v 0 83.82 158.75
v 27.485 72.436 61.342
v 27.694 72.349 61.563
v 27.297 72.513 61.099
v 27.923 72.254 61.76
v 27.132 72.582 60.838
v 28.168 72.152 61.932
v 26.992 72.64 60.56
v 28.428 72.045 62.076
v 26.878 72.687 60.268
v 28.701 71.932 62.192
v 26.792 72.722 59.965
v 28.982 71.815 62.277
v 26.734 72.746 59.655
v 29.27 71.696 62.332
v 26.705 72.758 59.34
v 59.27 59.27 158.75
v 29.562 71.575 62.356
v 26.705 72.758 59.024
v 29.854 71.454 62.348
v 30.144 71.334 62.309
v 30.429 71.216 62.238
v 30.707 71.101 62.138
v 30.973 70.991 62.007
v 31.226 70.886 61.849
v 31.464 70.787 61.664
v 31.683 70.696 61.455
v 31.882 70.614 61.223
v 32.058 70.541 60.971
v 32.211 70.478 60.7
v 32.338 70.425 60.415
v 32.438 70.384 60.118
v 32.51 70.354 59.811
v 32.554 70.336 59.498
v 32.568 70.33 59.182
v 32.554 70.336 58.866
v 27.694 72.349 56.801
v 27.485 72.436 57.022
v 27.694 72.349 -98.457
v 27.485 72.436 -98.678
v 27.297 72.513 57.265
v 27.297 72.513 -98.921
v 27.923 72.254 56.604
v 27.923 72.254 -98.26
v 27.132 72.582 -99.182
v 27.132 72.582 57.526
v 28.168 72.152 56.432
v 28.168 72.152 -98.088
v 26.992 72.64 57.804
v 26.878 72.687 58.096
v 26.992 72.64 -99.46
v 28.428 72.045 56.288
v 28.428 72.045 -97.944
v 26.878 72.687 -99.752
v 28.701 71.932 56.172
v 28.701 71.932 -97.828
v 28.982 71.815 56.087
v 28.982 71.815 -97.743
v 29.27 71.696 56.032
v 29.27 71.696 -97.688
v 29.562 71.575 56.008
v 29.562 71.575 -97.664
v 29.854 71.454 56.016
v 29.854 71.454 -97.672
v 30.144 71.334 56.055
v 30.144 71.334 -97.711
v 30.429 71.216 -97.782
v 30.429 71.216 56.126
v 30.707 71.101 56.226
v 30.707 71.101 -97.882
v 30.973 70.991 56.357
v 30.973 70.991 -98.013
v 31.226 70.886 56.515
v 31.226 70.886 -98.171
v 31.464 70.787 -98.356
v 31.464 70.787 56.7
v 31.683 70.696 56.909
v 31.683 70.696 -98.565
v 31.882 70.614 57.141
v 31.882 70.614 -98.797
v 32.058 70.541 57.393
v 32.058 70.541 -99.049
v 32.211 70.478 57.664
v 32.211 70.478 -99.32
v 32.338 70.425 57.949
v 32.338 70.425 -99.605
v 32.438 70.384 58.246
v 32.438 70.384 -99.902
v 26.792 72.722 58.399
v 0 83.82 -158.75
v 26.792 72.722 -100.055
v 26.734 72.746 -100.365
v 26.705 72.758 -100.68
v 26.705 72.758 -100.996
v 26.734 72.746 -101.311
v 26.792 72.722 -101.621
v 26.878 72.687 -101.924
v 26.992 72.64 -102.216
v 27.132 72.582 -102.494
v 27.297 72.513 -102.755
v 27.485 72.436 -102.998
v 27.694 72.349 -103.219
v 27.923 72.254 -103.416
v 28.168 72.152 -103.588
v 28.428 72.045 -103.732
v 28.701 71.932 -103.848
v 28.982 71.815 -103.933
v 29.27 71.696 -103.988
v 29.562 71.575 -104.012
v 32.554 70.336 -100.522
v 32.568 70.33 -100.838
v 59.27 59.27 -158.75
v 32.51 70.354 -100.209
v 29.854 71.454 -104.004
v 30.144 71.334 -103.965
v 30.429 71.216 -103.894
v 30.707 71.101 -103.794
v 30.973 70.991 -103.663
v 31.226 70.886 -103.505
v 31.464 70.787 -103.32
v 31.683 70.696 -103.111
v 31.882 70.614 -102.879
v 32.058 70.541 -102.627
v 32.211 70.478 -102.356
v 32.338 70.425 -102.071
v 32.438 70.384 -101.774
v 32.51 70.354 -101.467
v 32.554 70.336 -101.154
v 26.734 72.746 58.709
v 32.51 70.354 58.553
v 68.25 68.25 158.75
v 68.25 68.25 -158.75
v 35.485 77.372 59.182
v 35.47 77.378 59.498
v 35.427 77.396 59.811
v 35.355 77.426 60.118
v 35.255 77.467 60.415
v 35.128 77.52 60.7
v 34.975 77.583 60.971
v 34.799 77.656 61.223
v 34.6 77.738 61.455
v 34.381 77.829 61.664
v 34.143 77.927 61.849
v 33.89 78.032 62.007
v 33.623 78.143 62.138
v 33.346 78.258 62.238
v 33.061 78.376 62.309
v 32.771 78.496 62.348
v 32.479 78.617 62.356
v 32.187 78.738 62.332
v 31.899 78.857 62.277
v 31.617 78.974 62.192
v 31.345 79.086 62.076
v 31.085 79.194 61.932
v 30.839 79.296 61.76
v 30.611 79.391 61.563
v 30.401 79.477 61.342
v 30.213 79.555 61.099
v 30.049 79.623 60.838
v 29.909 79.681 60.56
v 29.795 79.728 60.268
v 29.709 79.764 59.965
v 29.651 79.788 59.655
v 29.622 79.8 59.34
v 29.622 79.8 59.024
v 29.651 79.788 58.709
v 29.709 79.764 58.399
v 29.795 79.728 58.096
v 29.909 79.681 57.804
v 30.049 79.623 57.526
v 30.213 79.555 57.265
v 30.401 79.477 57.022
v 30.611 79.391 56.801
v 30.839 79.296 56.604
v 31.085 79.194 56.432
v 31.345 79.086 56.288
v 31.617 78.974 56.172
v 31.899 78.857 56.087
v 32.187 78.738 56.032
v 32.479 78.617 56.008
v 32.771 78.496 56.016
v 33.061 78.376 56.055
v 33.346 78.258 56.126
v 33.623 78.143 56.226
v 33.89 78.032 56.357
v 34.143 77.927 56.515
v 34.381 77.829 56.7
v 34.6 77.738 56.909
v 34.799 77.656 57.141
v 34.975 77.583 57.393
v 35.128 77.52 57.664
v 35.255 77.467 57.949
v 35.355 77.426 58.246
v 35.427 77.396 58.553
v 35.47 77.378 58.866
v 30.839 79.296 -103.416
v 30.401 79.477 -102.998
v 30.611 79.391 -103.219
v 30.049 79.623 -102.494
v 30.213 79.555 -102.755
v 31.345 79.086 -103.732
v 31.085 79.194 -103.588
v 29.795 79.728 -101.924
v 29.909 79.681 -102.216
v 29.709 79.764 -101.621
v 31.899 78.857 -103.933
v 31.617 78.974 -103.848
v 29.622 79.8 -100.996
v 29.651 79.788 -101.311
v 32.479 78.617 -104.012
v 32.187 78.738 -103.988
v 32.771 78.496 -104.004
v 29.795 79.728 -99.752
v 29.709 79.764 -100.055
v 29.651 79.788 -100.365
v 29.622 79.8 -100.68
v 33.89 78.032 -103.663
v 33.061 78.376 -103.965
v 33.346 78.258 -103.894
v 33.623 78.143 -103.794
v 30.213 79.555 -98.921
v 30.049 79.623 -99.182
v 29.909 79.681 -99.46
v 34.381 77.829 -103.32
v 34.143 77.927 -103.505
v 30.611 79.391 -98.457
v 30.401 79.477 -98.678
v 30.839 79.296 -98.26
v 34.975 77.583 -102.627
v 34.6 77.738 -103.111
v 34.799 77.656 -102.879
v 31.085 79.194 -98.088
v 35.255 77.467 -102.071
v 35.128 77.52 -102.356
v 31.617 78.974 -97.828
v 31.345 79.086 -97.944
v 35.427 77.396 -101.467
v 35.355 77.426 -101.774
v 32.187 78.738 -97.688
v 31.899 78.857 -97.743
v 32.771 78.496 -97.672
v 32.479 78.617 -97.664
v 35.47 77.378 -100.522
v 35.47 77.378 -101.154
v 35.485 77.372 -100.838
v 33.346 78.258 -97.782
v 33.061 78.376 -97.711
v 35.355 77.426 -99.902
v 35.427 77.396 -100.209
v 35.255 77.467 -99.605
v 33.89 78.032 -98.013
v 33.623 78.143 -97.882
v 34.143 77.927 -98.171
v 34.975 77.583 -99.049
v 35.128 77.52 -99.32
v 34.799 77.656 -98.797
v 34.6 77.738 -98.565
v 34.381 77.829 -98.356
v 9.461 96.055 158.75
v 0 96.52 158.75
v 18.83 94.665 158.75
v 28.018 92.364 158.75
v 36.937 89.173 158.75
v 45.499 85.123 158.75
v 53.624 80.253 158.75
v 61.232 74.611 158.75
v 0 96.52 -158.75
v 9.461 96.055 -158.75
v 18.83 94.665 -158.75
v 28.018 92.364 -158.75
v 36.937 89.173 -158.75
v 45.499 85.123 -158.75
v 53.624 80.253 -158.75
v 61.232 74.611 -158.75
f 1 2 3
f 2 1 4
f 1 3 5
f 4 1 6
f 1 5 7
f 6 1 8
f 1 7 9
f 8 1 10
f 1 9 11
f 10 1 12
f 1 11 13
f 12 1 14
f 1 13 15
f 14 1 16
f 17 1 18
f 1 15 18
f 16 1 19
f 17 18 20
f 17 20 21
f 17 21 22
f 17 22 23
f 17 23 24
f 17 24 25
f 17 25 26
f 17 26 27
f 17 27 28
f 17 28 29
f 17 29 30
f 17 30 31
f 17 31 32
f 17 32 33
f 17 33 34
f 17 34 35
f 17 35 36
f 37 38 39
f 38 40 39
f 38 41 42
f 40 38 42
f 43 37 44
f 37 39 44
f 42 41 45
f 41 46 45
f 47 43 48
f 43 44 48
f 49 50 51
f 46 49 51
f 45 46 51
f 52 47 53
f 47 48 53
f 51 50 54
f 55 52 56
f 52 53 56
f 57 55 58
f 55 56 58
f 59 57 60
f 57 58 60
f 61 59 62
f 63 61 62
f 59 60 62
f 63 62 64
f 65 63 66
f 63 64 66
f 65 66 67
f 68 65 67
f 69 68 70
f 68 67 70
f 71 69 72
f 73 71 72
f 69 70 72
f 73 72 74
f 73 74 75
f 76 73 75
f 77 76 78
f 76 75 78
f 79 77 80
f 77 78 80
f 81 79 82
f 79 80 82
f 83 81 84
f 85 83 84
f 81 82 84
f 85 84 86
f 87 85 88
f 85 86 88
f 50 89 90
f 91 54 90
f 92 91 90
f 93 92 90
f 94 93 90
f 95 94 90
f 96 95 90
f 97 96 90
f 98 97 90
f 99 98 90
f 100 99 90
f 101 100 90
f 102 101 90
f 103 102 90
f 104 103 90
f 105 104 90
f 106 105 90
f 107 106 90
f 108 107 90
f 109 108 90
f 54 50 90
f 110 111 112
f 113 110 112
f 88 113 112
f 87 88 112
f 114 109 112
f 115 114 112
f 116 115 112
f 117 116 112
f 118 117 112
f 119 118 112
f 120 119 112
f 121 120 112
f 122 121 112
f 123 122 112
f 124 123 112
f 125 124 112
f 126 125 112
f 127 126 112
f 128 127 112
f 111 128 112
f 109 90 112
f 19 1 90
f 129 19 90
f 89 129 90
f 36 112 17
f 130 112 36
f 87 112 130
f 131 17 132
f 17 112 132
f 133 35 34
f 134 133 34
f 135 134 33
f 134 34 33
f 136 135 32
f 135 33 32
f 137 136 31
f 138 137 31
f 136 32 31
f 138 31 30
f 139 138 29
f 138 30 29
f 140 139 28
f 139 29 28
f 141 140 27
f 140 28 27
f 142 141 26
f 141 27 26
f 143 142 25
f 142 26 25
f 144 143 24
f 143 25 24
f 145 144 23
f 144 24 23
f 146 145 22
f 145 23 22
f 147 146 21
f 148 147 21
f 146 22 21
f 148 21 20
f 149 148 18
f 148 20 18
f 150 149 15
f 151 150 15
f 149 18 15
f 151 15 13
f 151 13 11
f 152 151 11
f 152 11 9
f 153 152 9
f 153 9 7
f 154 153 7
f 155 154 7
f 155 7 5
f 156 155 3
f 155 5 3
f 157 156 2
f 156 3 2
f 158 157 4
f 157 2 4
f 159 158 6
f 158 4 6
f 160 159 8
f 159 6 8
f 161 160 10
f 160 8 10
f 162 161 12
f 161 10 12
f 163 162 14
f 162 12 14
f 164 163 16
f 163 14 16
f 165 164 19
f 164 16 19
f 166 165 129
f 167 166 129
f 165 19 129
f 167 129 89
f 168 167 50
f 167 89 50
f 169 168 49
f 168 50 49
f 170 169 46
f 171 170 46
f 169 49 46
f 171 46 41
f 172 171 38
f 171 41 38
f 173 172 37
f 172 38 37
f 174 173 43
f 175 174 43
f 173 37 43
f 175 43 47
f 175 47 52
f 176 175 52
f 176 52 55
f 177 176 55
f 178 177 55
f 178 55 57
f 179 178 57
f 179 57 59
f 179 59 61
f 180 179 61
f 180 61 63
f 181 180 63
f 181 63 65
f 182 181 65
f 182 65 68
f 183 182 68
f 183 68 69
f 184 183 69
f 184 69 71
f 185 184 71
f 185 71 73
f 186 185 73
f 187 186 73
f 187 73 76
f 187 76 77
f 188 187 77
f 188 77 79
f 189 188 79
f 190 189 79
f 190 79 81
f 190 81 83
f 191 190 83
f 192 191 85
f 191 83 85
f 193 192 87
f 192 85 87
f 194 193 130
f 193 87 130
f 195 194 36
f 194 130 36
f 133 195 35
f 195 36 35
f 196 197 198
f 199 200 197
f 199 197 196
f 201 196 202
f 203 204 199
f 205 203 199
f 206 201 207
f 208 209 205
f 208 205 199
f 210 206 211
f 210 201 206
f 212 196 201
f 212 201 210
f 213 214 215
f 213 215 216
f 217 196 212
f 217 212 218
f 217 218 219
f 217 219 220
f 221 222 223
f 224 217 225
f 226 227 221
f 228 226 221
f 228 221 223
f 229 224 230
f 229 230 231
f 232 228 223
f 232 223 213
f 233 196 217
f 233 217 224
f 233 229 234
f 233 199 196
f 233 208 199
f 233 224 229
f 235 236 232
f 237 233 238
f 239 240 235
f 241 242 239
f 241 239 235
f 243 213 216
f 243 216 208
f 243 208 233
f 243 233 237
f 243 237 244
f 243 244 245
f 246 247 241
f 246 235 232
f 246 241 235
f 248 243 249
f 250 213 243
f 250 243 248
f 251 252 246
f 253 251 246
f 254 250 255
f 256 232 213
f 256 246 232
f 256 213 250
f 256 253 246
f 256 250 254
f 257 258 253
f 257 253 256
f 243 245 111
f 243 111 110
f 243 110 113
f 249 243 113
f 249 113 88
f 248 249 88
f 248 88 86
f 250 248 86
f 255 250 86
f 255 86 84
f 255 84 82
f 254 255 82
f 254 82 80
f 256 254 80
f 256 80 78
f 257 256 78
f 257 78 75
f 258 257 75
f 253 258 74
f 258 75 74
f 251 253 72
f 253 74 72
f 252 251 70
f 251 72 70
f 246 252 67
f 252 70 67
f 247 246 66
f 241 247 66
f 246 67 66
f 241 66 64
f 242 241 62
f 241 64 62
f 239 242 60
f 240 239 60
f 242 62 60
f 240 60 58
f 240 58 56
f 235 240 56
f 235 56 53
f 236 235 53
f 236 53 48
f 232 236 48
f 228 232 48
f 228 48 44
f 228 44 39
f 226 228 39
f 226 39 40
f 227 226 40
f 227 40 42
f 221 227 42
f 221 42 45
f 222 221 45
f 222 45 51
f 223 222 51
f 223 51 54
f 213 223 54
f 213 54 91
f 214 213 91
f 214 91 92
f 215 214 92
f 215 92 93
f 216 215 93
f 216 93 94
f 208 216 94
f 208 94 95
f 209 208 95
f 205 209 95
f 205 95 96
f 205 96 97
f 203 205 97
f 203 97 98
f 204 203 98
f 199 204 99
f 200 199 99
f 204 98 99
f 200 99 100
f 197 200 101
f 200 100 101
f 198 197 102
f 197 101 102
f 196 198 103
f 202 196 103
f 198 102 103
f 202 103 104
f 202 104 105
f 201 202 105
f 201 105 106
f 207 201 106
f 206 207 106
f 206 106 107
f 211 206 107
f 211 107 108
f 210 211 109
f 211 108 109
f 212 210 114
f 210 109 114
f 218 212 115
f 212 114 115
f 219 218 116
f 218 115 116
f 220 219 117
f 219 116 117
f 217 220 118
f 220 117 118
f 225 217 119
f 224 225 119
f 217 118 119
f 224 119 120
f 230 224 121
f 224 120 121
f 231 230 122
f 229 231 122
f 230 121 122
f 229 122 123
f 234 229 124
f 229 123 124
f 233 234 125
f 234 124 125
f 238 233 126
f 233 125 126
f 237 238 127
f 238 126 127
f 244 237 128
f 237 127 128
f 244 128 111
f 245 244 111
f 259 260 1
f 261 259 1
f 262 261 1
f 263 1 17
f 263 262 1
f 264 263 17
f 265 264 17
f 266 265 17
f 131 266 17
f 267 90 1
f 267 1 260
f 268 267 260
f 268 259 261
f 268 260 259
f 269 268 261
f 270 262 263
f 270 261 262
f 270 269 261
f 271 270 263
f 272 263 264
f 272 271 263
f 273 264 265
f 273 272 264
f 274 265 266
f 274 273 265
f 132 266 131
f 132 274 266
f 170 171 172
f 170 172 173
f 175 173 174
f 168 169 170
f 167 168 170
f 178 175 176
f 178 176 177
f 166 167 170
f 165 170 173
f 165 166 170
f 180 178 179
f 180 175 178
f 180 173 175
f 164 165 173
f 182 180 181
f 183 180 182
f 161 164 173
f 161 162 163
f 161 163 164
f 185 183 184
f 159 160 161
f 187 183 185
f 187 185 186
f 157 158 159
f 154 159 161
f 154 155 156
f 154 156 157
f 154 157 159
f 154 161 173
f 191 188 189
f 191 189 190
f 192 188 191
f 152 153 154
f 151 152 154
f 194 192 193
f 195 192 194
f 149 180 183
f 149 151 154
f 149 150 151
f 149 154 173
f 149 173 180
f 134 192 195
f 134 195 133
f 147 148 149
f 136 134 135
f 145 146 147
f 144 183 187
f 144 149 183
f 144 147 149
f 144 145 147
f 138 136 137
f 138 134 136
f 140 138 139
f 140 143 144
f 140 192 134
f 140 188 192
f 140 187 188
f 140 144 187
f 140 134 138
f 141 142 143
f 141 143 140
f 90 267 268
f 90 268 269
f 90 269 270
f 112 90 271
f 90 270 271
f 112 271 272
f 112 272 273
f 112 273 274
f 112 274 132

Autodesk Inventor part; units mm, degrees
ref_plane "YZ Plane" through (0, 0, 0) normal (1, 0, 0) x (0, 1, 0)
ref_plane "XZ Plane" through (0, 0, 0) normal (0, 1, 0) x (-1, 0, 0)
ref_plane "XY Plane" through (0, 0, 0) normal (0, 0, 1) x (1, 0, 0)
sketch "Sketch1" plane through (0, 0, 0) normal (0, 0, 1) x (1, 0, 0)
  line L0 (0, 0) -> (96.52, 0) construction
  line L1 (0, 83.82) -> (0, 96.52)
  line L2 (59.2697, 59.2697) -> (68.2499, 68.2499)
  line L3 (68.2499, 68.2499) -> (59.2697, 59.2697)
  line L4 (0, 83.82) -> (59.2697, 59.2697)
  arc A0 (68.2499, 68.2499) -> (0, 96.52) centre (0, 0) ccw
extrude "Extrusion1" add sketch "Sketch1" along normal mid plane 317.5
sketch "Sketch2" plane through (59.2697, 59.2697, -158.75) normal (-0.3827, -0.9239, 0) x (0.9239, -0.3827, 0)
  circle A0 centre (-32.0765, 57.912) radius 3.175
  line L0 (0, 0) -> (-64.1531, 0) projected
  circle A1 centre (-32.0765, 217.932) radius 3.175
  point P0 (-32.0765, 158.75)
  dimension "d5" = 6.35
  dimension "d6" = 57.912
  dimension "d7" = 6.35
  dimension "d8" = 160.02
extrude "Extrusion2" cut sketch "Sketch2" against normal blind 7.62
properties part number "Foot2"
